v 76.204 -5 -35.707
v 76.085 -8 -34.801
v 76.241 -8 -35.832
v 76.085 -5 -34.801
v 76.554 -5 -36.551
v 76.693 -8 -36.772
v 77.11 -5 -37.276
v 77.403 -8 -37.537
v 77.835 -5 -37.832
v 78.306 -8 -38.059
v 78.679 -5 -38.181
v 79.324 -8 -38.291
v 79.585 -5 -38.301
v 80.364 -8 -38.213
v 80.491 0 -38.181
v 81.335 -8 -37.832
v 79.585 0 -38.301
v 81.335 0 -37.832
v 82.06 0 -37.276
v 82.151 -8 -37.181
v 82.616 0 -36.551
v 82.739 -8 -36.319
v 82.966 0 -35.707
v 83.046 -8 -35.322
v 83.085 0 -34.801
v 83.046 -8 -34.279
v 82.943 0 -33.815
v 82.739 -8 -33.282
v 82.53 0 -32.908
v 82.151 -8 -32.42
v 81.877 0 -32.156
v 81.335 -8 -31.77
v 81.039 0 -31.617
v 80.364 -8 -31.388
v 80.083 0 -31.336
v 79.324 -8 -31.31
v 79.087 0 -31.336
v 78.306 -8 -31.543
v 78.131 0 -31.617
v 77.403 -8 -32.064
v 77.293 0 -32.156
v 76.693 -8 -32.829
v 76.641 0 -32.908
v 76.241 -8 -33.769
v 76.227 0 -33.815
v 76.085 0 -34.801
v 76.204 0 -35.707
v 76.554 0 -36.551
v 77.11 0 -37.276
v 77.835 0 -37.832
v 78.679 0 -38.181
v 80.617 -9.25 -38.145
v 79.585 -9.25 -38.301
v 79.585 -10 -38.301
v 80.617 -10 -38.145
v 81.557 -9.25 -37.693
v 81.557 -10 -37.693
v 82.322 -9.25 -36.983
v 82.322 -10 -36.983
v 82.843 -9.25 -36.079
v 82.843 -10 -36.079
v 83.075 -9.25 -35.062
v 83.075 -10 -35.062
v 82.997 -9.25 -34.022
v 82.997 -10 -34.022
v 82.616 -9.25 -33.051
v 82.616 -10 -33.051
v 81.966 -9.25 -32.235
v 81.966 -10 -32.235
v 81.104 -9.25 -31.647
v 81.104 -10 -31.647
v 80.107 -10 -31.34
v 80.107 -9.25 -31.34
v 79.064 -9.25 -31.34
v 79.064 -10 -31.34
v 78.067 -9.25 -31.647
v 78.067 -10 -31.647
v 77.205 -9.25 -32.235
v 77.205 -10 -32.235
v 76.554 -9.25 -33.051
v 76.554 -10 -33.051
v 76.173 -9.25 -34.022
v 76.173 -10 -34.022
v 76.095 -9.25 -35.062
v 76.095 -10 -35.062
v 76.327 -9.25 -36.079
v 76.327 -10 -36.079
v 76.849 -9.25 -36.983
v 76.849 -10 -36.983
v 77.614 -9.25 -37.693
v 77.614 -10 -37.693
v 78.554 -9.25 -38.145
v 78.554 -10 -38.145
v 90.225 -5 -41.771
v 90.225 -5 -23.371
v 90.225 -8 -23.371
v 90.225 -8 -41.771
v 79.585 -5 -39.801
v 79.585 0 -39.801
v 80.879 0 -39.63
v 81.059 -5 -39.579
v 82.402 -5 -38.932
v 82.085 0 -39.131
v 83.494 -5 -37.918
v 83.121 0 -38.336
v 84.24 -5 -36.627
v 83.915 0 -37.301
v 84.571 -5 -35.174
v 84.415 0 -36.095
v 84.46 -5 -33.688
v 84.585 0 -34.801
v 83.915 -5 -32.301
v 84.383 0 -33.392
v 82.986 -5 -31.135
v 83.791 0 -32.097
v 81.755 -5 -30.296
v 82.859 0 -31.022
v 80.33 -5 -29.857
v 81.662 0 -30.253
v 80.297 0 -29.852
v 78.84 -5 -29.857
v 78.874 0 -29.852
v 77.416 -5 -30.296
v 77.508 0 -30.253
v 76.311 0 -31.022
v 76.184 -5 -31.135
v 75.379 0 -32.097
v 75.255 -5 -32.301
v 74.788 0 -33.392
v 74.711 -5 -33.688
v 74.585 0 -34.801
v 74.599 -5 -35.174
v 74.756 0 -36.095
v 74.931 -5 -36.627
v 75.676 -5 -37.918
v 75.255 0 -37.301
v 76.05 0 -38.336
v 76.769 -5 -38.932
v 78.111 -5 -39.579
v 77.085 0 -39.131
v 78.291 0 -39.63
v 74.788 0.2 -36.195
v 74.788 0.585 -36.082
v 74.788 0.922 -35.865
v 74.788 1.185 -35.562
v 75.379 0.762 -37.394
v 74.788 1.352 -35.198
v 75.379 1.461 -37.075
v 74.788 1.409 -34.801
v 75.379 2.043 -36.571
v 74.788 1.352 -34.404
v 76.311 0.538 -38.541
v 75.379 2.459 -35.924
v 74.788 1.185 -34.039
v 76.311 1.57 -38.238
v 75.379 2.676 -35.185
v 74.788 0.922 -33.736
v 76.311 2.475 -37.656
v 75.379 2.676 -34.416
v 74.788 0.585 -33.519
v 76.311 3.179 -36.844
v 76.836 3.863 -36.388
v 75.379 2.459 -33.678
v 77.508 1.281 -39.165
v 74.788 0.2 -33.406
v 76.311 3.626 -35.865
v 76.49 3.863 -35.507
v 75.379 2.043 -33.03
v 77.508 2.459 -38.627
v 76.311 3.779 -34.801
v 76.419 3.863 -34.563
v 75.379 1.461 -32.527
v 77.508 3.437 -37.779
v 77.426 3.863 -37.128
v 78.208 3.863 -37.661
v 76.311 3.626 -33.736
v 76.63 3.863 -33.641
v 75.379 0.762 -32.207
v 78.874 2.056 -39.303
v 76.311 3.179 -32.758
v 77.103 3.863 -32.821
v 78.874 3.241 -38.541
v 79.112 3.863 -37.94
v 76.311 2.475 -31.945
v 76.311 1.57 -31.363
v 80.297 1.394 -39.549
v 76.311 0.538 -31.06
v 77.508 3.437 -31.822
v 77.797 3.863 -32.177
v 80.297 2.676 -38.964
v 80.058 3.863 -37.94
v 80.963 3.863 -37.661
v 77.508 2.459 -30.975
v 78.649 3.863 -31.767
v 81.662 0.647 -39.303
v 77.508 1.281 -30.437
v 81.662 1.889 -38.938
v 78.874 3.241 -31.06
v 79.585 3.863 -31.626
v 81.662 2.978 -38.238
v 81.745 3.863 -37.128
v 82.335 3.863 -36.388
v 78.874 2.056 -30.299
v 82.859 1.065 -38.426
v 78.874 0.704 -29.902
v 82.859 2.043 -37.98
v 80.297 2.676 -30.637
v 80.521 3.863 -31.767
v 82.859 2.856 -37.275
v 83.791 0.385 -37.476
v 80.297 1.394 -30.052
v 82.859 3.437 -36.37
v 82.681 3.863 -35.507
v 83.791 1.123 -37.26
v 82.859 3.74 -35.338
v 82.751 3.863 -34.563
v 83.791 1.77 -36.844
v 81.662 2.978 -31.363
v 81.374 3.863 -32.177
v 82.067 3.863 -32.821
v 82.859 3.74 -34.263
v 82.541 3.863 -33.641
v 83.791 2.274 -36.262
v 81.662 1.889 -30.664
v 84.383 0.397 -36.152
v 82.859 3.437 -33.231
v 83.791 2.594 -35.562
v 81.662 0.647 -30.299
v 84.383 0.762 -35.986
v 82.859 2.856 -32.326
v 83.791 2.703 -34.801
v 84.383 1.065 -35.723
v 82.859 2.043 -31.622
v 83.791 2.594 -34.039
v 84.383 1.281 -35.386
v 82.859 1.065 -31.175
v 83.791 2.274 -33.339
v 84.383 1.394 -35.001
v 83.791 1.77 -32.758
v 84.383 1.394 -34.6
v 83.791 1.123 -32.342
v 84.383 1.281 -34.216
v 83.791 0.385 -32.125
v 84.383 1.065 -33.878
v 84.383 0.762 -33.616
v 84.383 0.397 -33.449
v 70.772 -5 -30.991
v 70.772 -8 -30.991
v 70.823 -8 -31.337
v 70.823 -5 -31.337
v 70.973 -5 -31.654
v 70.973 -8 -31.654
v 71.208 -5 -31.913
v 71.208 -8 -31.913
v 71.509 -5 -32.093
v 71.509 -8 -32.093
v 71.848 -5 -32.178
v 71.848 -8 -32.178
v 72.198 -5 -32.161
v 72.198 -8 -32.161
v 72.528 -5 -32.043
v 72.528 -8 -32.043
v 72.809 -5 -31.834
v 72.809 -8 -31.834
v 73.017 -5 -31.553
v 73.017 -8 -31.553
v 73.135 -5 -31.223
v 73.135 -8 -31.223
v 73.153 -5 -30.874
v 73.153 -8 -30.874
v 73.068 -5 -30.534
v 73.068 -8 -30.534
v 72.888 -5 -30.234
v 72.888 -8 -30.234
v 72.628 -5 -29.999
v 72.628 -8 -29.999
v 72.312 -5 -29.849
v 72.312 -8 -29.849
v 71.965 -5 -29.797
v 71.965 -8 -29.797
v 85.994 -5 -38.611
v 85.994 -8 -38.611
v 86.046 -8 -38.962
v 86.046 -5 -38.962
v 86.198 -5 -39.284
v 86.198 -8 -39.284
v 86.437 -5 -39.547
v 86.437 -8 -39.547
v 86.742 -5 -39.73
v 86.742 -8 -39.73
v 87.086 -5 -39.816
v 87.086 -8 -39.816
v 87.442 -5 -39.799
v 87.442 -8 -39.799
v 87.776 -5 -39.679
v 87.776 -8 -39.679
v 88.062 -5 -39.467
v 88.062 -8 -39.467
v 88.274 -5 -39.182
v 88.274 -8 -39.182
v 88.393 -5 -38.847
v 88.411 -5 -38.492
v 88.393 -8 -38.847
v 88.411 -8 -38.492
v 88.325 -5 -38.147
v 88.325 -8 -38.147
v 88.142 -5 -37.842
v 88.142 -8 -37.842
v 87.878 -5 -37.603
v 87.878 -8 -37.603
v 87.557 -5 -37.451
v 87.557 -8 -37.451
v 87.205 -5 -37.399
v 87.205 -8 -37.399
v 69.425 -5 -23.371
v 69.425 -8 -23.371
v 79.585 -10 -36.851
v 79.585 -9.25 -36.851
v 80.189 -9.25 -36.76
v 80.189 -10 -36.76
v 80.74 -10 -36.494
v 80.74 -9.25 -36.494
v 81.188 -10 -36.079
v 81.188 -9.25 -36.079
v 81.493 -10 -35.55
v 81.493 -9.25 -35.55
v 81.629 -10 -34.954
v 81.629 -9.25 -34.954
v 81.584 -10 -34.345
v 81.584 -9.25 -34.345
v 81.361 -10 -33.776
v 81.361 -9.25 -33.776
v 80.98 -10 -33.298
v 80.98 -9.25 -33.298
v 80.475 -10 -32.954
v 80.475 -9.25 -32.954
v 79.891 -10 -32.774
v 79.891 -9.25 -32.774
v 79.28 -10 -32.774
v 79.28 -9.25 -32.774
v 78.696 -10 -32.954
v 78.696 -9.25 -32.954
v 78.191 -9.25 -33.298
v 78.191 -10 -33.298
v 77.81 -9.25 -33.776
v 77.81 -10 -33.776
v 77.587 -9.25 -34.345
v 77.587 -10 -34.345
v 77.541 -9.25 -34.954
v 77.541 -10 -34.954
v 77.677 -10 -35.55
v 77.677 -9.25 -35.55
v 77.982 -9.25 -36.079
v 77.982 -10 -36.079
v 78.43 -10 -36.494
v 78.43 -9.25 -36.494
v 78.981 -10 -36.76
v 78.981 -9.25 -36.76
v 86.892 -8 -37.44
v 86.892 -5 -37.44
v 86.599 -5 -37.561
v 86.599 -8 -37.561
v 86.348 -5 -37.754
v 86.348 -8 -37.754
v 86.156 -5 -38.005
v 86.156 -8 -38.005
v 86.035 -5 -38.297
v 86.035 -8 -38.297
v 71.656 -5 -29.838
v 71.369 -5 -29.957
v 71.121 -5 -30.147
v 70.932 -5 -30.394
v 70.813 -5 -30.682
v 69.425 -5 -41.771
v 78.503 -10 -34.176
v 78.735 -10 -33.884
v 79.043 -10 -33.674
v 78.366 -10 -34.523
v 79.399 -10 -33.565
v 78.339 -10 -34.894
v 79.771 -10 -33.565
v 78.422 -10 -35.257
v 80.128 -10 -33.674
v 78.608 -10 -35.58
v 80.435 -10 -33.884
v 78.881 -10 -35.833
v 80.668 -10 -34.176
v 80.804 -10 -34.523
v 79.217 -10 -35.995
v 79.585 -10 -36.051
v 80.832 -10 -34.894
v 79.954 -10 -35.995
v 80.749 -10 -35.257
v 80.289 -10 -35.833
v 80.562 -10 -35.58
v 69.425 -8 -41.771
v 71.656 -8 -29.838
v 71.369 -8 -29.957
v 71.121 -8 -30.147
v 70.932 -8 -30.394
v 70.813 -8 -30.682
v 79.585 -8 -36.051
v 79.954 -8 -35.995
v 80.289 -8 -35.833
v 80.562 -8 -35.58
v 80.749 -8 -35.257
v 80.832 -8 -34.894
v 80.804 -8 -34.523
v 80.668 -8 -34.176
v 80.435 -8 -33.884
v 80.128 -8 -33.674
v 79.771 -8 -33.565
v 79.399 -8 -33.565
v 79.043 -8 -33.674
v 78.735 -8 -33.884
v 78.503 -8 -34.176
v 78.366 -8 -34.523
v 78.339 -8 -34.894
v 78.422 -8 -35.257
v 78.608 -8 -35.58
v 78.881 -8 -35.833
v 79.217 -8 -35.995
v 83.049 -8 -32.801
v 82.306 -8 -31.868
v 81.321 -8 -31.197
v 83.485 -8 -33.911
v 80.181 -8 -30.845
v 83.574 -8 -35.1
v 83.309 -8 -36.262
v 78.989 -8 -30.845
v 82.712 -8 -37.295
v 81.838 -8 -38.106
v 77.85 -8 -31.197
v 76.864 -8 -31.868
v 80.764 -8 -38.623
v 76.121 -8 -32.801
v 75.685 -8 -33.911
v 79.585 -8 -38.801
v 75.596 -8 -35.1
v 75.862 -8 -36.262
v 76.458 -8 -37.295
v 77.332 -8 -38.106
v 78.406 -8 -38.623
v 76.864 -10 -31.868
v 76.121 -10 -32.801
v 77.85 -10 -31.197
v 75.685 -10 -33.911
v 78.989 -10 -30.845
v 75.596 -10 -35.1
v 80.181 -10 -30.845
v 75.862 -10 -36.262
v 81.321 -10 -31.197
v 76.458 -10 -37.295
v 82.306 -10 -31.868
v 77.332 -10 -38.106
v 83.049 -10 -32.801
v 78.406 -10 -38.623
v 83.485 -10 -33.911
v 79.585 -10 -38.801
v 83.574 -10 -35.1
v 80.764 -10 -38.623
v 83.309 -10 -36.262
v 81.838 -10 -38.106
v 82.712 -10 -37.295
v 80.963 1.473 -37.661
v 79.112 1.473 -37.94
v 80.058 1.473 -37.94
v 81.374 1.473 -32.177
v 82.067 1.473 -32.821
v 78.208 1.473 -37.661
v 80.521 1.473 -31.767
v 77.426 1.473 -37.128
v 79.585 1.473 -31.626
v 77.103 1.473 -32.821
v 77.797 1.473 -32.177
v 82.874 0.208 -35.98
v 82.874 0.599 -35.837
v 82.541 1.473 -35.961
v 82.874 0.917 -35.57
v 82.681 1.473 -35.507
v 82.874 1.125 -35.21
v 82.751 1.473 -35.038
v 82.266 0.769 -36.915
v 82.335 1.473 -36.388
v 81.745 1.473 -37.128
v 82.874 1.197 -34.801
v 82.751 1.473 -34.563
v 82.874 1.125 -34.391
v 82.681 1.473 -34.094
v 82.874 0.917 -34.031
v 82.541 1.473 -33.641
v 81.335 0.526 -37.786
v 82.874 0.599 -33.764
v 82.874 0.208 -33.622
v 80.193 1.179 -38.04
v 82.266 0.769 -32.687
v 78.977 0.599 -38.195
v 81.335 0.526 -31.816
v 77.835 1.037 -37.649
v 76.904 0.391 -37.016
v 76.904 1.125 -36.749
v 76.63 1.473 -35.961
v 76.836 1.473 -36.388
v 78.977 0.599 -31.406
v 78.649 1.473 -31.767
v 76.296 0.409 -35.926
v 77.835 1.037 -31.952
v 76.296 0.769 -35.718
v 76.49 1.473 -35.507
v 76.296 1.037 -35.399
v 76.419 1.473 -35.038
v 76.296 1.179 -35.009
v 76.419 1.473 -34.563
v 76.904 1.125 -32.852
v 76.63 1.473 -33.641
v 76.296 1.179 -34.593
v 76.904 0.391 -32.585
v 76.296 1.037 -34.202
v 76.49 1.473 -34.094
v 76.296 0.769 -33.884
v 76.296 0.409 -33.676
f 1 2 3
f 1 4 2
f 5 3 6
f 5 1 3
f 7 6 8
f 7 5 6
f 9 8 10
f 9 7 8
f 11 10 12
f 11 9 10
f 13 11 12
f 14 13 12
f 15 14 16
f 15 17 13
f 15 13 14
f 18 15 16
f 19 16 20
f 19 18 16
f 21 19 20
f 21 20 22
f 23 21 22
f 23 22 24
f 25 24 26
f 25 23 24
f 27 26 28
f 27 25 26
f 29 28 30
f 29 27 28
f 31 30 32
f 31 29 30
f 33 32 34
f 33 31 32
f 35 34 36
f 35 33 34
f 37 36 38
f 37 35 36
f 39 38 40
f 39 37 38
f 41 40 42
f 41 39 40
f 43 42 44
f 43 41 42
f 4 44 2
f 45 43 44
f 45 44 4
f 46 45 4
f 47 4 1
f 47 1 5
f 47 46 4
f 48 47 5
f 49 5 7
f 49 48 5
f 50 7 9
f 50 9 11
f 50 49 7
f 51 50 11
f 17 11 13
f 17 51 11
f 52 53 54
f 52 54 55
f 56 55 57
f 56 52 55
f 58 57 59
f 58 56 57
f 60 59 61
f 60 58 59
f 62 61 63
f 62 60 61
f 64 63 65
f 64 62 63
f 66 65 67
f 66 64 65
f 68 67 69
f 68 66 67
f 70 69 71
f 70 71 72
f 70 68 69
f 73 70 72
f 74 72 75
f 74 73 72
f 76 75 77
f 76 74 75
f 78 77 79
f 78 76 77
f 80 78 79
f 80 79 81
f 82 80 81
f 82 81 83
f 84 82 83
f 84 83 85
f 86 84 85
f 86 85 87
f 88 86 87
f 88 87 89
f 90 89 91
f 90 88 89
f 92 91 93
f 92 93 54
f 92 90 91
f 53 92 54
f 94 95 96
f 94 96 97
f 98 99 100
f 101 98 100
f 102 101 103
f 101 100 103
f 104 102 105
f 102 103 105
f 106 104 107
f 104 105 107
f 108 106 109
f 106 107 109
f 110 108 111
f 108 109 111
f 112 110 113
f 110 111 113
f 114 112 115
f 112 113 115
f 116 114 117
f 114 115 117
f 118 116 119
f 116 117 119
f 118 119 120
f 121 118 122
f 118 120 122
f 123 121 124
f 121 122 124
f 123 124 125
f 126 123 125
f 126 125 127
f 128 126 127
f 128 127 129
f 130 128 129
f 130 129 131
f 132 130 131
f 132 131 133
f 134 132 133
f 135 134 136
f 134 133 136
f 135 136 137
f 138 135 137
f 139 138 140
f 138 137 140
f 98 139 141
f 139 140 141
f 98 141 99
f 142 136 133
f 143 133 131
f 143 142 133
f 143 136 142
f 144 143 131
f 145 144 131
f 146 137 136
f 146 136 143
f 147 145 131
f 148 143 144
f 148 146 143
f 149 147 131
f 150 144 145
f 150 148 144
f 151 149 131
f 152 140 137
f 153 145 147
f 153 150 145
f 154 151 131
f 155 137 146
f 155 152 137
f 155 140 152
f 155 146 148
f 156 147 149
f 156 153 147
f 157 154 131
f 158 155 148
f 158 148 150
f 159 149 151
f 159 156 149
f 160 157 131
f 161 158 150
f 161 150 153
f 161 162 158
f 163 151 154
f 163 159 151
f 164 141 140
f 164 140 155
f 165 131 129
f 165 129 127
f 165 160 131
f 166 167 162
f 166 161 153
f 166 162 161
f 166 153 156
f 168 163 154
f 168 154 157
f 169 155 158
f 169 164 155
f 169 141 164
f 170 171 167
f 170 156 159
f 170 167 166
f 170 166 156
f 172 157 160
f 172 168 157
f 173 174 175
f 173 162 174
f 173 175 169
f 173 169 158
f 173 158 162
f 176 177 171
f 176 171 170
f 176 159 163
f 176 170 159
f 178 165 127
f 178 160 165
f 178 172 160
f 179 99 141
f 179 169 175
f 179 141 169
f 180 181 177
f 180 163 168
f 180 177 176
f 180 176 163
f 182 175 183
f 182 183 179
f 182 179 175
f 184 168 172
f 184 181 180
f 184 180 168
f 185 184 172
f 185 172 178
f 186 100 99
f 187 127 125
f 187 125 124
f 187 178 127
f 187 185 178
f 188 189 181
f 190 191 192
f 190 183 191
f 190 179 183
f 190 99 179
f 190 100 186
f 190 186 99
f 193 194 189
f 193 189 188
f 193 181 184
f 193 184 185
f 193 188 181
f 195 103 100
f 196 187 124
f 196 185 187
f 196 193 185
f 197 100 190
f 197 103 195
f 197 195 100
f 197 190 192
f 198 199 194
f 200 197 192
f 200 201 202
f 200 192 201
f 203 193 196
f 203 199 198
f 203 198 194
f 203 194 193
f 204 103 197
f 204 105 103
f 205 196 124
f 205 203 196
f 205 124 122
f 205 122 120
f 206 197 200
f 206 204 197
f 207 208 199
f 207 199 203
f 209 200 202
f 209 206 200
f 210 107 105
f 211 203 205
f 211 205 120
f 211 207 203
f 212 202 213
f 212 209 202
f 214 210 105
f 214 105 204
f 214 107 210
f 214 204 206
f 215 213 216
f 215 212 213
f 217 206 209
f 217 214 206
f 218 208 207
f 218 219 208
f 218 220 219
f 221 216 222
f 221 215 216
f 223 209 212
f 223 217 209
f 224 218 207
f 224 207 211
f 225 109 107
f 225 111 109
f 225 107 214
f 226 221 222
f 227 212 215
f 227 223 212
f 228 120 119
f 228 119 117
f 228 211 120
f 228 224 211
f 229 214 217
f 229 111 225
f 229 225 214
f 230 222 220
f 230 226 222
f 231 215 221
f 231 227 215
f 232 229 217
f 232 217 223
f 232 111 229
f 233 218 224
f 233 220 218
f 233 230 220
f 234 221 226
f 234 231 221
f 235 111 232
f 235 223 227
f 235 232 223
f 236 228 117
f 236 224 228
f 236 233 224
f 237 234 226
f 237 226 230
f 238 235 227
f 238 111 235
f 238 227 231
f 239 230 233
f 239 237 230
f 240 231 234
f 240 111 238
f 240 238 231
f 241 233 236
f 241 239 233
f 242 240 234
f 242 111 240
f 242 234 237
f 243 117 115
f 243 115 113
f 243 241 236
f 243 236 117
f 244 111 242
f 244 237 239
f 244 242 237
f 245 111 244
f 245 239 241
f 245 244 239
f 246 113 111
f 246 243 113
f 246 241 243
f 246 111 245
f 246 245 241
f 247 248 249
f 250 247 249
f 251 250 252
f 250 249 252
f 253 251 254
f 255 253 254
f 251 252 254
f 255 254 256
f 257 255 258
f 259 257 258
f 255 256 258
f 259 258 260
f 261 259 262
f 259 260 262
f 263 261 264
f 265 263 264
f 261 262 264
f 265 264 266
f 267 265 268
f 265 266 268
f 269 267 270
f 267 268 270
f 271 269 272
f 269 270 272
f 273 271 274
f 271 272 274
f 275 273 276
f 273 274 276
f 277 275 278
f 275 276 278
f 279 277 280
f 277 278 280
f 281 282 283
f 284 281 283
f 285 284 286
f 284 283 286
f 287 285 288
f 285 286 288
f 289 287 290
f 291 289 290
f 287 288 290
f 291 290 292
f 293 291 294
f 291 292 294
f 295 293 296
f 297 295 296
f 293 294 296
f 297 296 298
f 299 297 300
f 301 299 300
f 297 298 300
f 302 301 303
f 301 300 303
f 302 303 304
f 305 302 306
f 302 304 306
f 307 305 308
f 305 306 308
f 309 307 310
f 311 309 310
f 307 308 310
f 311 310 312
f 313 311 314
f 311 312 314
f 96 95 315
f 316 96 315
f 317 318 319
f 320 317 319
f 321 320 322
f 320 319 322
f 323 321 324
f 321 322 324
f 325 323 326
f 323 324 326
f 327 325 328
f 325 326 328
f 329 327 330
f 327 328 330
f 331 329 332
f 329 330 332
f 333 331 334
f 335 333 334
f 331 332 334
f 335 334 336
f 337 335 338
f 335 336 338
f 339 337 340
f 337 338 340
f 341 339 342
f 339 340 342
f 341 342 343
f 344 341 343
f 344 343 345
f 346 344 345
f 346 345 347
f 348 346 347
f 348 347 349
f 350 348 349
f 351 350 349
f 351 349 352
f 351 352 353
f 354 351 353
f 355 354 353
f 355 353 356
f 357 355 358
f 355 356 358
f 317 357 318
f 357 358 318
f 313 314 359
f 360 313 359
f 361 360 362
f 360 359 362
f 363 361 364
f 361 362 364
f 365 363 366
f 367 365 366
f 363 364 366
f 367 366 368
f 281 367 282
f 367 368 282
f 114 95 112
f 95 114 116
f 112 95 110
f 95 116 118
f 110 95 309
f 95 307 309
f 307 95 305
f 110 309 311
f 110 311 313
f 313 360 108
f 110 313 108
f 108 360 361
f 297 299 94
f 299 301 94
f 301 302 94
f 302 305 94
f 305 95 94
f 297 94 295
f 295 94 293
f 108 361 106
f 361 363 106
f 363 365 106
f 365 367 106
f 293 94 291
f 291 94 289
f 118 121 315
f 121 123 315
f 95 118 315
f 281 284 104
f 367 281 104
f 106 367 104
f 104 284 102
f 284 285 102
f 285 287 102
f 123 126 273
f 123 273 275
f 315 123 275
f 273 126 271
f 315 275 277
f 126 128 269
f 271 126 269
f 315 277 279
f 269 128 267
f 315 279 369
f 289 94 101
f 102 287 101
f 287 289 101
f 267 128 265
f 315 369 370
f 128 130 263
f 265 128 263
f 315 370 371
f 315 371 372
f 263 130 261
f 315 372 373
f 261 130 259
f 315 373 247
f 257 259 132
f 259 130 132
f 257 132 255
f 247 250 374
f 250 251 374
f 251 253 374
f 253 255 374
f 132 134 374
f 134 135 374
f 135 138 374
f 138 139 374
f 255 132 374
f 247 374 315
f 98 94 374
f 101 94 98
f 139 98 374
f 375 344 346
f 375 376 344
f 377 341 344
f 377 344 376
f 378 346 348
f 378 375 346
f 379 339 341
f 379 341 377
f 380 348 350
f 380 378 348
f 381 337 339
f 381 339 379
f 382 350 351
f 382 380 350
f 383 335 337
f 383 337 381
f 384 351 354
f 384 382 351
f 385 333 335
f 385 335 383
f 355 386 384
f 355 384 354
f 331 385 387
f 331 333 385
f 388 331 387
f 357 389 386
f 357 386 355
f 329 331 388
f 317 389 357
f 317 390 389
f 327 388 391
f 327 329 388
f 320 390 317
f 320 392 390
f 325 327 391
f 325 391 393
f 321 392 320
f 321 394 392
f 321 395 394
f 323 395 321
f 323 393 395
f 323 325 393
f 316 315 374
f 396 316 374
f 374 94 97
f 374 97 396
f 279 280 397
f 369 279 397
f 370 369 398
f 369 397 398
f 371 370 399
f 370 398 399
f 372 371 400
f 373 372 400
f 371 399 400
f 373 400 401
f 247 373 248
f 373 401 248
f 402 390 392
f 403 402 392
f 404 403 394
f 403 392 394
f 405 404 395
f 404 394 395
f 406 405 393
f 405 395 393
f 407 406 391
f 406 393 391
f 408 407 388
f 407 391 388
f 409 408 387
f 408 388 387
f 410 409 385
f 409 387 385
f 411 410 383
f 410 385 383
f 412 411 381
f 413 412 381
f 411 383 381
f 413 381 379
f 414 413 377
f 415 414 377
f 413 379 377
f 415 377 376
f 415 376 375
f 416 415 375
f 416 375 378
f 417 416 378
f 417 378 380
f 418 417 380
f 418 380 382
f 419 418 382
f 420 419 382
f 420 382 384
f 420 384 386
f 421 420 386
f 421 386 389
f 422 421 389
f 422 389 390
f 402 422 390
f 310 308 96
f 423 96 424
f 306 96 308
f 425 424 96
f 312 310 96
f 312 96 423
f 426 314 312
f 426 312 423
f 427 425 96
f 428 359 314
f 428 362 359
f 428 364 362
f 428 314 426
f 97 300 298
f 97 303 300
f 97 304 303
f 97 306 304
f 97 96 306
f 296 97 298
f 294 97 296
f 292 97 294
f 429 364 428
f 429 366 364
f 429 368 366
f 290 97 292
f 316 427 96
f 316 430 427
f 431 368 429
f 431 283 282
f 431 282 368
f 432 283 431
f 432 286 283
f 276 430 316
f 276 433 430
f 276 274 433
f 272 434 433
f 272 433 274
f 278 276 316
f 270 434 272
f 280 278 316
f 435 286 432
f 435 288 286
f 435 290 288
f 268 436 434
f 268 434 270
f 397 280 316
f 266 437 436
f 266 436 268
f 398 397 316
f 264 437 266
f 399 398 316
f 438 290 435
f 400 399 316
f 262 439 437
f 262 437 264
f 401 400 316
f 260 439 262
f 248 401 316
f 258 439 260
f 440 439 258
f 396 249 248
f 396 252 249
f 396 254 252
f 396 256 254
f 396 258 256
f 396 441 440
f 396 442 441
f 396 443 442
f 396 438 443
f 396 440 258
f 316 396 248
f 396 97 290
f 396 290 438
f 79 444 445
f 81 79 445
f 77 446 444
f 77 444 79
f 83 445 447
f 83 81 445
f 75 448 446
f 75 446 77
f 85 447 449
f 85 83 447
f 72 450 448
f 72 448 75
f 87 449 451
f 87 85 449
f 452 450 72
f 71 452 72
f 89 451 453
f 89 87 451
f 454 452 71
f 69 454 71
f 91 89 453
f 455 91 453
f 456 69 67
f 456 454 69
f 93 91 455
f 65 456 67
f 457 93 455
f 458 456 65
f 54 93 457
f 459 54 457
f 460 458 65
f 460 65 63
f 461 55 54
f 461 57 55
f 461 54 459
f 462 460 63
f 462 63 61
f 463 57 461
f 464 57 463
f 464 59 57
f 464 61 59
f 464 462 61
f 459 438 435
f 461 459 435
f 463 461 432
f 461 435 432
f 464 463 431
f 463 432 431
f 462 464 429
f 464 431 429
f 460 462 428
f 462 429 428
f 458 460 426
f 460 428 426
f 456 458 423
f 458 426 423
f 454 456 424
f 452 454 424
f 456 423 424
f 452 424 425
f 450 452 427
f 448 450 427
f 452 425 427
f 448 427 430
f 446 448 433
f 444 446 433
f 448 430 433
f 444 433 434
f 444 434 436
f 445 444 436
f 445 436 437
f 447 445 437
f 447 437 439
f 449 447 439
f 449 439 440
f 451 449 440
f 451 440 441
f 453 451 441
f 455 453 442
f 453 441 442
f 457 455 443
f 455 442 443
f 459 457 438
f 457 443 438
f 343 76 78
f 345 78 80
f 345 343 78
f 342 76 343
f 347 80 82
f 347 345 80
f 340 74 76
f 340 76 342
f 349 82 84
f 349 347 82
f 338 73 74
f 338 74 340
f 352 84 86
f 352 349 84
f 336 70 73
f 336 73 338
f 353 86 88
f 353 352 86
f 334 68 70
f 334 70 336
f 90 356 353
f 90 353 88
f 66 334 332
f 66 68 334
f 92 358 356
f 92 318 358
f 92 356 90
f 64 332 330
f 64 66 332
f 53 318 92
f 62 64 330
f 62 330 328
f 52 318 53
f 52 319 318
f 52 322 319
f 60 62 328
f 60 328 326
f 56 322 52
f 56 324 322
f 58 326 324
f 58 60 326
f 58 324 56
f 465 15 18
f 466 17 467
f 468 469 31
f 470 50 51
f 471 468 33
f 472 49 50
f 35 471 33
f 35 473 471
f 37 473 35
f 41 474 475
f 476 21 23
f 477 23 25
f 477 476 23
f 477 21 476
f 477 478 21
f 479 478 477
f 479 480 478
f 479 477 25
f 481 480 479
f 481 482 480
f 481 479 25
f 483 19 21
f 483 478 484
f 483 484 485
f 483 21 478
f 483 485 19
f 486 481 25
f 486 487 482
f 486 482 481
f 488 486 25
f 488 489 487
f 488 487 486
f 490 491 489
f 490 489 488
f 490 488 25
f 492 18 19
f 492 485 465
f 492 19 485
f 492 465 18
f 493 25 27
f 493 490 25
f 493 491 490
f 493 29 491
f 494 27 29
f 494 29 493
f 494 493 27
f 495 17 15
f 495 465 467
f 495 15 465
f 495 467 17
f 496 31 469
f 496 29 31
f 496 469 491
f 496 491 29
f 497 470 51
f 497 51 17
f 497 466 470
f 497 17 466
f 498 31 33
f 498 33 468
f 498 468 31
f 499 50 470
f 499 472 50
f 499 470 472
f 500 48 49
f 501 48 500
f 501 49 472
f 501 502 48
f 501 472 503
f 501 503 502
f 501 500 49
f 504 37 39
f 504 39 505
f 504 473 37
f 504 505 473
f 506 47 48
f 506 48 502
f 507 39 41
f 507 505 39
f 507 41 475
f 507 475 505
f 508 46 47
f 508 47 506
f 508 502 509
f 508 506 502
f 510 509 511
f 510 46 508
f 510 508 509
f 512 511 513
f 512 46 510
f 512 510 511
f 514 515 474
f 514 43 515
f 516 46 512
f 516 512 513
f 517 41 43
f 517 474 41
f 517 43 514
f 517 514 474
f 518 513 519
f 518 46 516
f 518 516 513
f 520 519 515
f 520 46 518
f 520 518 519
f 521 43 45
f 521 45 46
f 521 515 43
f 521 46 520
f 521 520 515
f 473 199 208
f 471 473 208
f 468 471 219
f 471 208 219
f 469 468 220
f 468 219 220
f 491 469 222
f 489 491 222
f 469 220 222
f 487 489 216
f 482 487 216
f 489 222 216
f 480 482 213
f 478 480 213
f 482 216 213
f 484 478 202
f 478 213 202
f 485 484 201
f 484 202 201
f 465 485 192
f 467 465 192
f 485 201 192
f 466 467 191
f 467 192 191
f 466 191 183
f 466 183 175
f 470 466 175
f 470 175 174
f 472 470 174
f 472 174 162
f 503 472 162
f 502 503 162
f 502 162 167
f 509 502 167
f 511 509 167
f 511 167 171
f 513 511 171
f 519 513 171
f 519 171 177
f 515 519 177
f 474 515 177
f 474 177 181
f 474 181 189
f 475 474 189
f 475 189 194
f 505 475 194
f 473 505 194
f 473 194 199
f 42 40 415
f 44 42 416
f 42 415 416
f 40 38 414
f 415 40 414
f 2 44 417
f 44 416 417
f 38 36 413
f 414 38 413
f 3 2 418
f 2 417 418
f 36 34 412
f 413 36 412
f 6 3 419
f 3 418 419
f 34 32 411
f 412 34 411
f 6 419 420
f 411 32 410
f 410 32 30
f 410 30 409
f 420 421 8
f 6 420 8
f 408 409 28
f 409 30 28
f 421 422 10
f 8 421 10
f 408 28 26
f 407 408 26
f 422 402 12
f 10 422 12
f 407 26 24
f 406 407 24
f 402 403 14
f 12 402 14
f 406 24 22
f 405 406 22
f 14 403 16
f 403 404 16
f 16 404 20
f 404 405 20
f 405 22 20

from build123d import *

# Parameters (mm, degrees)
REVOLVE1_ANGLE             = 180
SKETCH3_R                  = 5
SKETCH3_R_2                = 3.5
BOSS_EXTRUDE1_DEPTH        = 5
F_1_4_0_2500_DOWEL_HOLE2_D = 6.35
SKETCH8_W                  = 20.8
SKETCH8_H                  = 18.4
SKETCH8_R                  = 3.5
BOSS_EXTRUDE3_DEPTH        = 3
CUT_EXTRUDE1_DEPTH         = 101.130363876
SKETCH11_R                 = 4
BOSS_EXTRUDE4_DEPTH        = 2
SKETCH12_R                 = 1.25
CUT_EXTRUDE2_DEPTH         = 5
CUT_EXTRUDE4_START         = -0.75
SKETCH13_R                 = 3.5
SKETCH13_R_2               = 2.05
CUT_EXTRUDE4_DEPTH         = 0.75


with BuildPart() as part:
    # Sketch2 → Revolve1 (revolve)
    with BuildSketch(Plane(origin=(0, 0, 0), x_dir=(1, 0, 0), z_dir=(0, 1, 0))):
        with BuildLine():
            Line((76.085159762, 34.800683112), (74.585159762, 34.800683112))
            ThreePointArc((74.585159762, 34.800683112), (79.585159762, 39.800683112), (84.585159762, 34.800683112))
            Line((84.585159762, 34.800683112), (83.085159762, 34.800683112))
            ThreePointArc((83.085159762, 34.800683112), (79.585159762, 38.300683112), (76.085159762, 34.800683112))
        make_face()
    revolve(axis=Axis((79.585159762, 0, -34.800683112), (1, 0, 0)), revolution_arc=REVOLVE1_ANGLE)

    # Sketch3 → Boss-Extrude1 (add)
    with BuildSketch(Plane.XZ):
        with Locations(Location((79.585159762, -34.800683112, 0), (0, 0, 270))):
            Circle(SKETCH3_R)
        with Locations(Location((79.585159762, -34.800683112, 0), (0, 0, 270))):
            Circle(SKETCH3_R_2, mode=Mode.SUBTRACT)
    extrude(amount=BOSS_EXTRUDE1_DEPTH)

    # 1/4 (0.2500) Dowel Hole2 (through all)
    with Locations(Plane(origin=(79.585159762, -5, -34.800683112), x_dir=(0, 0, -1), z_dir=(0, -1, 0))):
        with Locations((0, 0)):
            Hole(F_1_4_0_2500_DOWEL_HOLE2_D / 2)

    # Sketch8 → Boss-Extrude3 (add)
    with BuildSketch(Plane(origin=(0, -5, 0), x_dir=(-1, 0, 0), z_dir=(0, -1, 0))):
        with Locations((-79.825159762, 32.570683112)):
            Rectangle(SKETCH8_W, SKETCH8_H)
        with Locations((-79.585159762, 34.800683112)):
            Circle(SKETCH8_R, mode=Mode.SUBTRACT)
    extrude(amount=BOSS_EXTRUDE3_DEPTH)

    # Sketch10 → Cut-Extrude1 (cut, through all)
    with BuildSketch(Plane(origin=(0, -8, 0), x_dir=(-1, 0, 0), z_dir=(0, -1, 0))):
        with BuildLine():
            ThreePointArc((-85.993577992, 38.610683112), (-88.061877446, 39.467400797), (-87.205159762, 37.399101343))
            Line((-87.205159762, 37.399101343), (-87.205159762, 38.610683112))
            Line((-87.205159762, 38.610683112), (-85.993577992, 38.610683112))
        make_face()
        with BuildLine():
            Line((-87.205159762, 38.610683112), (-87.205159762, 37.399101343))
            ThreePointArc((-87.205159762, 37.399101343), (-86.348442077, 37.753965427), (-85.993577992, 38.610683112))
            Line((-85.993577992, 38.610683112), (-87.205159762, 38.610683112))
        make_face()
        with BuildLine():
            ThreePointArc((-70.771962331, 30.990683112), (-72.808877756, 31.834401106), (-71.965159762, 29.797485681))
            Line((-71.965159762, 29.797485681), (-71.965159762, 30.990683112))
            Line((-71.965159762, 30.990683112), (-70.771962331, 30.990683112))
        make_face()
        with BuildLine():
            Line((-71.965159762, 30.990683112), (-71.965159762, 29.797485681))
            ThreePointArc((-71.965159762, 29.797485681), (-71.121441767, 30.146965118), (-70.771962331, 30.990683112))
            Line((-70.771962331, 30.990683112), (-71.965159762, 30.990683112))
        make_face()
    extrude(amount=-CUT_EXTRUDE1_DEPTH, mode=Mode.SUBTRACT)

    # Sketch11 → Boss-Extrude4 (add)
    with BuildSketch(Plane(origin=(0, -8, 0), x_dir=(-1, 0, 0), z_dir=(0, -1, 0))):
        with Locations(Location((-79.585159762, 34.800683112, 0), (0, 0, 90))):
            Circle(SKETCH11_R)
    extrude(amount=BOSS_EXTRUDE4_DEPTH)

    # Sketch12 → Cut-Extrude2 (cut)
    with BuildSketch(Plane(origin=(0, -10, 0), x_dir=(-1, 0, 0), z_dir=(0, -1, 0))):
        with Locations(Location((-79.585159762, 34.800683112, 0), (0, 0, 90))):
            Circle(SKETCH12_R)
    extrude(amount=-CUT_EXTRUDE2_DEPTH, mode=Mode.SUBTRACT)

    # Sketch13 → Cut-Extrude4 (cut)
    with BuildSketch(Plane(origin=(0, -10, 0), x_dir=(-1, 0, 0), z_dir=(0, -1, 0)).offset(CUT_EXTRUDE4_START)):
        with Locations(Location((-79.585159762, 34.800683112, 0), (0, 0, 90))):
            Circle(SKETCH13_R)
        with Locations(Location((-79.585159762, 34.800683112, 0), (0, 0, 90))):
            Circle(SKETCH13_R_2, mode=Mode.SUBTRACT)
    extrude(amount=CUT_EXTRUDE4_DEPTH, mode=Mode.SUBTRACT)


solid = part.part
